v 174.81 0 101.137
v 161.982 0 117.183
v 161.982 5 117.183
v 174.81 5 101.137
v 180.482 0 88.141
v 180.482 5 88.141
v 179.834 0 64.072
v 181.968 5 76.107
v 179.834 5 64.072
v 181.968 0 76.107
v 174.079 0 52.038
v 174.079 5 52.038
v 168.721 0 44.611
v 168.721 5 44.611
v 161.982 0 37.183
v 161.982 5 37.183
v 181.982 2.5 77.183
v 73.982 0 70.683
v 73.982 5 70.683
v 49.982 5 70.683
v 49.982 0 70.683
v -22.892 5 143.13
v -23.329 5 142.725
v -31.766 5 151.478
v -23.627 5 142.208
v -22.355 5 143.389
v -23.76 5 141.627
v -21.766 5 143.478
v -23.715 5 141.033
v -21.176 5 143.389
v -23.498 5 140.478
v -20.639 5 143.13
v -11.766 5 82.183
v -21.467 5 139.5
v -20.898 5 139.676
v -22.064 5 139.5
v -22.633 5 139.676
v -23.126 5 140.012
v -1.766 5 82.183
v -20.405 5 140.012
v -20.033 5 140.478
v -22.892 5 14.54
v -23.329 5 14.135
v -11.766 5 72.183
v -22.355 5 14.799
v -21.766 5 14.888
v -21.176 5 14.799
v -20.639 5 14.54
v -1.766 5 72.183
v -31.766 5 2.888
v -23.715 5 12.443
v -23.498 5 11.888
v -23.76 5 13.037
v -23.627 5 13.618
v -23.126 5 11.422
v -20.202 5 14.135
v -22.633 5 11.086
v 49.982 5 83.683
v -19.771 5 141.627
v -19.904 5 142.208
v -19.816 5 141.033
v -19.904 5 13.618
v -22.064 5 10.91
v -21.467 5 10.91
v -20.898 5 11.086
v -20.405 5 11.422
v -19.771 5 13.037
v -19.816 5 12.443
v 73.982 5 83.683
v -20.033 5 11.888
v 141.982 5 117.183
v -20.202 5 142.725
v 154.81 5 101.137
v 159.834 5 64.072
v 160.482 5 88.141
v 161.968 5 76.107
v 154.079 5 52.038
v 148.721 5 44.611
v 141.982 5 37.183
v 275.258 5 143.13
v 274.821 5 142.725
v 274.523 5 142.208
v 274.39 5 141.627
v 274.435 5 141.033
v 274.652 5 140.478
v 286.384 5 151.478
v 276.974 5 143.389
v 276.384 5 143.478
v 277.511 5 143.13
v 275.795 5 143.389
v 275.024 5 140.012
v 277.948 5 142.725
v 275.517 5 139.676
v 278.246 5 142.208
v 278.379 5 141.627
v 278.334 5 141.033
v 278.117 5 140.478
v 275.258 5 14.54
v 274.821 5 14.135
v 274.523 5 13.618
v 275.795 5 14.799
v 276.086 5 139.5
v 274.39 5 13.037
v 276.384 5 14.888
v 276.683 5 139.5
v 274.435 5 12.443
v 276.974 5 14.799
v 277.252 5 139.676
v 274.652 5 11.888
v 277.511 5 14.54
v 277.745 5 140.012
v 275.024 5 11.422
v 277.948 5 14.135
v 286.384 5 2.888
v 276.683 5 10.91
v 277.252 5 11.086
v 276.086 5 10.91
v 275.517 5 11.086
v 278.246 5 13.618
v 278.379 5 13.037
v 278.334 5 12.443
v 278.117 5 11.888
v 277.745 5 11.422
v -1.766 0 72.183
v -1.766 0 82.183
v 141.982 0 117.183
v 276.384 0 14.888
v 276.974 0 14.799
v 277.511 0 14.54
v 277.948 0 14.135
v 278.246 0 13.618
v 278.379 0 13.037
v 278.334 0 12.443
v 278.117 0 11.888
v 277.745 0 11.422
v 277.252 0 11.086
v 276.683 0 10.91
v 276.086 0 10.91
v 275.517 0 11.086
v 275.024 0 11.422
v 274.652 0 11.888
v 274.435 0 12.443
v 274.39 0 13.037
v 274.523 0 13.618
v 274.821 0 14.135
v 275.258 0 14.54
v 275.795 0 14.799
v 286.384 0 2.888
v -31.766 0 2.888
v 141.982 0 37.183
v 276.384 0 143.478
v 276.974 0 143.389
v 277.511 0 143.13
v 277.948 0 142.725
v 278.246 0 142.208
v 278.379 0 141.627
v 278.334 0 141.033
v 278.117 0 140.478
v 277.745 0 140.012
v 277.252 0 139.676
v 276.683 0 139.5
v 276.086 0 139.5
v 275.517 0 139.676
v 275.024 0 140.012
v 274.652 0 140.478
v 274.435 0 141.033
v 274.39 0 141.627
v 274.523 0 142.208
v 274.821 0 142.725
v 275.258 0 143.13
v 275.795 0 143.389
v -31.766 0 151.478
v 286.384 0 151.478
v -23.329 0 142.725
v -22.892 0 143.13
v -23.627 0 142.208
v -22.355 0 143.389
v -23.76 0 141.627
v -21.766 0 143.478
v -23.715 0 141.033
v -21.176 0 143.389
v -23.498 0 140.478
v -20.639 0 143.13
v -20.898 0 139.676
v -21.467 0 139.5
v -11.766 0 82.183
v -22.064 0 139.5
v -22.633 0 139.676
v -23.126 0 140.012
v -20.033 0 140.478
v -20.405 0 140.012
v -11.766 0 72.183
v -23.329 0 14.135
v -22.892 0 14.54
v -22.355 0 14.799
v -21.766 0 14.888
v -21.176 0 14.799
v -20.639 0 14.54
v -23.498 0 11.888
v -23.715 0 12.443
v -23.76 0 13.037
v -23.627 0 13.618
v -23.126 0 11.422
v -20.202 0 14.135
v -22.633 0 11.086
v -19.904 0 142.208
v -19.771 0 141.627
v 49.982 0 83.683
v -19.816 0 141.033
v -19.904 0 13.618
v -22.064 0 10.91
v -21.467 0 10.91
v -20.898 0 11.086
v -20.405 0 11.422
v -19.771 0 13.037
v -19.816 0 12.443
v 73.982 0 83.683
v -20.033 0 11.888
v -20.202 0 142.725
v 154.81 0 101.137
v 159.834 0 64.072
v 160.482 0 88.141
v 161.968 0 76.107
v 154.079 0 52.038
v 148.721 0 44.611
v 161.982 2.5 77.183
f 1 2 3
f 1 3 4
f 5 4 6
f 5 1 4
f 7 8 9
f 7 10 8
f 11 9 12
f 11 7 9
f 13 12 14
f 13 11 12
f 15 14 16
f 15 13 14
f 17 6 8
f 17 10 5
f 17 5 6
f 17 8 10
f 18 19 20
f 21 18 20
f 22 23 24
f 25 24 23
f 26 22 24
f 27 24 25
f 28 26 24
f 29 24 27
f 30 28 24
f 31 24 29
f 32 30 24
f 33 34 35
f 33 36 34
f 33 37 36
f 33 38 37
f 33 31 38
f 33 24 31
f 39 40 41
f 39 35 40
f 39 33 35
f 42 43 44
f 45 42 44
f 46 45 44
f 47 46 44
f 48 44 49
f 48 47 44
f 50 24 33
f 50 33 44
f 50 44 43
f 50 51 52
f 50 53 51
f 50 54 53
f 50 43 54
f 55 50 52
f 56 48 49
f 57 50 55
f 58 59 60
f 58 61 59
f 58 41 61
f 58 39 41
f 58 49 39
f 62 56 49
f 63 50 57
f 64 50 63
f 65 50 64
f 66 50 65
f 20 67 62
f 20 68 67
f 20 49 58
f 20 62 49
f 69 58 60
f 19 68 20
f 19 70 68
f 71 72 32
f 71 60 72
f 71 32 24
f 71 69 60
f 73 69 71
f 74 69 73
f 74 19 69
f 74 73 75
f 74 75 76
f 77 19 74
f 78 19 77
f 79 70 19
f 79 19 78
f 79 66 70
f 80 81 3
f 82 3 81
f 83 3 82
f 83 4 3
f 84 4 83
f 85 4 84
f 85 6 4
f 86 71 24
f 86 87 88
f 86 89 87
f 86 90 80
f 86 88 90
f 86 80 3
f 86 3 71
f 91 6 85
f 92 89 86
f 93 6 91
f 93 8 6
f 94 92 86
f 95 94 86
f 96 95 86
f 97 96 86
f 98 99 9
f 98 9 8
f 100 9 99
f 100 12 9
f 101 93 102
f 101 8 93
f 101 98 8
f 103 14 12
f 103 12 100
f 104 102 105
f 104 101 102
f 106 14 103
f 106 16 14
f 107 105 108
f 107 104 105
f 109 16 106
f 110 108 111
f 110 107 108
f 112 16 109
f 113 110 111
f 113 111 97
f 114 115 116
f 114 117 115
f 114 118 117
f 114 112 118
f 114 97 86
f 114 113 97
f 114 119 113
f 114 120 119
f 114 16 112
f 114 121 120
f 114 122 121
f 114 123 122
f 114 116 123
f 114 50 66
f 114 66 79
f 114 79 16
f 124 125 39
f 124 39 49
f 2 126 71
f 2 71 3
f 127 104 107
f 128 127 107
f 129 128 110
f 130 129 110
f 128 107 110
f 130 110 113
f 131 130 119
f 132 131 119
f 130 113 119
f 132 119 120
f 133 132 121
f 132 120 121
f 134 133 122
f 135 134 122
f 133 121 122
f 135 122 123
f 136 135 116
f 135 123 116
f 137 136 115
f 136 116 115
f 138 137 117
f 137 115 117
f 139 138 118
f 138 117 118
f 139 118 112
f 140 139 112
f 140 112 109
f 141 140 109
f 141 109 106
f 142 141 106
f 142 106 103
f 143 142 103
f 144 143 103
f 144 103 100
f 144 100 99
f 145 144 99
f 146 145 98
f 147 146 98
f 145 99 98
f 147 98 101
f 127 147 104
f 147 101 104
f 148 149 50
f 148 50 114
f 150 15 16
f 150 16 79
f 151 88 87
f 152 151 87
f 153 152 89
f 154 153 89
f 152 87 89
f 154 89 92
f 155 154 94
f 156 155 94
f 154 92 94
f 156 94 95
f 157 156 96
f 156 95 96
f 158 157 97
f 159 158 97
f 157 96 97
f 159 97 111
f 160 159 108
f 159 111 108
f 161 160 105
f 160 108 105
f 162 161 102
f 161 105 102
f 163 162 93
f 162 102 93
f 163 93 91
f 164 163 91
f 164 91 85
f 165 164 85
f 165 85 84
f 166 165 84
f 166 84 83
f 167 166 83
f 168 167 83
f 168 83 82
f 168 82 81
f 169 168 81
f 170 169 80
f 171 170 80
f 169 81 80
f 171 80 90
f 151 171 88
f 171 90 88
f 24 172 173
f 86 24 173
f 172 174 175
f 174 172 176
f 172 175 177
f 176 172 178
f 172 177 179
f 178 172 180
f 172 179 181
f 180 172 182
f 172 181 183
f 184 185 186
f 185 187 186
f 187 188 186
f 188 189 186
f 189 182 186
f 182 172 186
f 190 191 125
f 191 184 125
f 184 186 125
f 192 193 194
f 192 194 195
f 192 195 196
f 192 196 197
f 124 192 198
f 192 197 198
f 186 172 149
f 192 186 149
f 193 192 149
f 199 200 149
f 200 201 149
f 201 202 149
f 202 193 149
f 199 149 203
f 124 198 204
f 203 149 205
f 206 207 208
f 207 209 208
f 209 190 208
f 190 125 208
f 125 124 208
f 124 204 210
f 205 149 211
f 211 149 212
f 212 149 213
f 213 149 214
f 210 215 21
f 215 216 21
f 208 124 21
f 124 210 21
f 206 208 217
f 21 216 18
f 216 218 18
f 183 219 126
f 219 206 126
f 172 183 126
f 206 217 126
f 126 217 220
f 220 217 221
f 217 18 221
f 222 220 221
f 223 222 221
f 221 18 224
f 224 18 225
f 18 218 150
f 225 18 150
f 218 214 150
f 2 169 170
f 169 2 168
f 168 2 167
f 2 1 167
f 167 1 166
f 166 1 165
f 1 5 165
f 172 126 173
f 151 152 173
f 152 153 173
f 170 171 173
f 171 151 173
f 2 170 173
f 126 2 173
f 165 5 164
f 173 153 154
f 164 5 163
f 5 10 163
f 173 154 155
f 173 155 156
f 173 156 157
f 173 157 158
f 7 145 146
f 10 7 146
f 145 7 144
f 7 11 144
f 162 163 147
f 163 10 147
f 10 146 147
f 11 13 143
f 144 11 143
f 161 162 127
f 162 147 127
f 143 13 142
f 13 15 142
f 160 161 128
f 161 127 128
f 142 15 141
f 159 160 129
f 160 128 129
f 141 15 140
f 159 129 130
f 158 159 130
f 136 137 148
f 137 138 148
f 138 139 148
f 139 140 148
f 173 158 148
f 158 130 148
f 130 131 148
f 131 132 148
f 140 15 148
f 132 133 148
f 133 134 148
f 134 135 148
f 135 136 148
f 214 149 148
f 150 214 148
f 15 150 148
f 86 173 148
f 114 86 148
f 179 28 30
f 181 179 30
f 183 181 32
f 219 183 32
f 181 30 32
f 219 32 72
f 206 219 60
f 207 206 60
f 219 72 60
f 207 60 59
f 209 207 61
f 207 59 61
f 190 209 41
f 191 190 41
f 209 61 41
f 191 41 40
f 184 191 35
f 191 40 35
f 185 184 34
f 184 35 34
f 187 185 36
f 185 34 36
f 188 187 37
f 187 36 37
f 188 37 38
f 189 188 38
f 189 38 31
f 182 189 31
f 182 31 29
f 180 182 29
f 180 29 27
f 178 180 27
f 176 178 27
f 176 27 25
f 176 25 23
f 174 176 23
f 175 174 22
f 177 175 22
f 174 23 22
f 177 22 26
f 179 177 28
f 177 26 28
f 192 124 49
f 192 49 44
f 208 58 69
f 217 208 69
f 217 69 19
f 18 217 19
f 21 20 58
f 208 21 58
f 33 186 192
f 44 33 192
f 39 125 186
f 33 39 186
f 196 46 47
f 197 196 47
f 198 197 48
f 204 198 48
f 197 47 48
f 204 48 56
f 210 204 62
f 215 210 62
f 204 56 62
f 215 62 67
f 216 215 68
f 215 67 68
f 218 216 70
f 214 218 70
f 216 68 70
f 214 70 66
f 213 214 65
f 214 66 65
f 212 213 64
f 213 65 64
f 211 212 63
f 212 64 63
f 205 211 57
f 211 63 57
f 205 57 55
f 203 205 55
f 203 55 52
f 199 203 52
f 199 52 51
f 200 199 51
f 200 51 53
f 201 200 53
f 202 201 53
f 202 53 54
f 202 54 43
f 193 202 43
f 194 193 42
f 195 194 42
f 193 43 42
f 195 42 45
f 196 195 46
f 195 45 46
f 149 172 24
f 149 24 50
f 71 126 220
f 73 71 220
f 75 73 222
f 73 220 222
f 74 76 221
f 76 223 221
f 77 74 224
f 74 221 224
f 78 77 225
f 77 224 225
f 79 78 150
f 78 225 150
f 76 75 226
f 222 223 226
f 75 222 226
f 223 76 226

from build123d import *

# Parameters (mm, degrees)
ESQUISSE2_W             = 318.15
ESQUISSE2_H             = 148.59
BOSS_EXTRU_1_DEPTH      = 5
ESQUISSE3_R             = 2
ENL_V_MAT_EXTRU_1_DEPTH = 5
ENL_V_MAT_EXTRU_2_DEPTH = 5
ENL_V_MAT_EXTRU_3_DEPTH = 5
ESQUISSE7_W             = 10
ESQUISSE7_H             = 10
ENL_V_MAT_EXTRU_4_DEPTH = 5


with BuildPart() as part:
    # Esquisse2 → Boss.-Extru.1 (new body)
    with BuildSketch(Plane(origin=(0, 0, 0), x_dir=(1, 0, 0), z_dir=(0, 1, 0))):
        with Locations((127.309454852, -77.182817805)):
            Rectangle(ESQUISSE2_W, ESQUISSE2_H)
    extrude(amount=BOSS_EXTRU_1_DEPTH)

    # Esquisse3 → Enlèv. mat.-Extru.1 (cut)
    with BuildSketch(Plane(origin=(0, 5, 0), x_dir=(1, 0, 0), z_dir=(0, 1, 0))):
        with Locations(Location((276.384454852, -141.477817805, 0), (0, 0, 270))):
            Circle(ESQUISSE3_R)
        with Locations(Location((276.384454852, -12.887817805, 0), (0, 0, 270))):
            Circle(ESQUISSE3_R)
        with Locations(Location((-21.765545148, -12.887817805, 0), (0, 0, 270))):
            Circle(ESQUISSE3_R)
        with Locations(Location((-21.765545148, -141.477817805, 0), (0, 0, 270))):
            Circle(ESQUISSE3_R)
    extrude(amount=-ENL_V_MAT_EXTRU_1_DEPTH, mode=Mode.SUBTRACT)

    # Esquisse4 → Enlèv. mat.-Extru.2 (cut)
    with BuildSketch(Plane(origin=(0, 5, 0), x_dir=(1, 0, 0), z_dir=(0, 1, 0))):
        Polygon((73.982481978, -83.682817805), (73.982481978, -77.182817805), (56.982481978, -77.182817805), (49.982481978, -77.182817805), (49.982481978, -83.682817805), align=None)
        Polygon((56.982481978, -77.182817805), (73.982481978, -77.182817805), (73.982481978, -70.682817805), (49.982481978, -70.682817805), (49.982481978, -77.182817805), align=None)
    extrude(amount=-ENL_V_MAT_EXTRU_2_DEPTH, mode=Mode.SUBTRACT)

    # Esquisse6 → Enlèv. mat.-Extru.3 (cut)
    with BuildSketch(Plane(origin=(0, 0, 0), x_dir=(-1, 0, 0), z_dir=(0, -1, 0))):
        with BuildLine():
            Line((-161.982481978, -37.182817805), (-141.982481978, -37.182817805))
            add(Edge.make_bspline(
                [(-141.982481978, -117.182817805), (-181.982481978, -77.182817805), (-141.982481978, -37.182817805)],
                knots=[0, 0, 0, 1, 1, 1], degree=2))
            Line((-141.982481978, -117.182817805), (-161.982481978, -117.182817805))
            add(Edge.make_bspline(
                [(-161.982481978, -117.182817805), (-201.982481978, -77.182817805), (-161.982481978, -37.182817805)],
                knots=[0, 0, 0, 1, 1, 1], degree=2))
        make_face()
    extrude(amount=-ENL_V_MAT_EXTRU_3_DEPTH, mode=Mode.SUBTRACT)

    # Esquisse7 → Enlèv. mat.-Extru.4 (cut)
    with BuildSketch(Plane(origin=(0, 0, 0), x_dir=(-1, 0, 0), z_dir=(0, -1, 0))):
        with Locations((6.765545148, -77.182817805)):
            Rectangle(ESQUISSE7_W, ESQUISSE7_H)
    extrude(amount=-ENL_V_MAT_EXTRU_4_DEPTH, mode=Mode.SUBTRACT)


solid = part.part
